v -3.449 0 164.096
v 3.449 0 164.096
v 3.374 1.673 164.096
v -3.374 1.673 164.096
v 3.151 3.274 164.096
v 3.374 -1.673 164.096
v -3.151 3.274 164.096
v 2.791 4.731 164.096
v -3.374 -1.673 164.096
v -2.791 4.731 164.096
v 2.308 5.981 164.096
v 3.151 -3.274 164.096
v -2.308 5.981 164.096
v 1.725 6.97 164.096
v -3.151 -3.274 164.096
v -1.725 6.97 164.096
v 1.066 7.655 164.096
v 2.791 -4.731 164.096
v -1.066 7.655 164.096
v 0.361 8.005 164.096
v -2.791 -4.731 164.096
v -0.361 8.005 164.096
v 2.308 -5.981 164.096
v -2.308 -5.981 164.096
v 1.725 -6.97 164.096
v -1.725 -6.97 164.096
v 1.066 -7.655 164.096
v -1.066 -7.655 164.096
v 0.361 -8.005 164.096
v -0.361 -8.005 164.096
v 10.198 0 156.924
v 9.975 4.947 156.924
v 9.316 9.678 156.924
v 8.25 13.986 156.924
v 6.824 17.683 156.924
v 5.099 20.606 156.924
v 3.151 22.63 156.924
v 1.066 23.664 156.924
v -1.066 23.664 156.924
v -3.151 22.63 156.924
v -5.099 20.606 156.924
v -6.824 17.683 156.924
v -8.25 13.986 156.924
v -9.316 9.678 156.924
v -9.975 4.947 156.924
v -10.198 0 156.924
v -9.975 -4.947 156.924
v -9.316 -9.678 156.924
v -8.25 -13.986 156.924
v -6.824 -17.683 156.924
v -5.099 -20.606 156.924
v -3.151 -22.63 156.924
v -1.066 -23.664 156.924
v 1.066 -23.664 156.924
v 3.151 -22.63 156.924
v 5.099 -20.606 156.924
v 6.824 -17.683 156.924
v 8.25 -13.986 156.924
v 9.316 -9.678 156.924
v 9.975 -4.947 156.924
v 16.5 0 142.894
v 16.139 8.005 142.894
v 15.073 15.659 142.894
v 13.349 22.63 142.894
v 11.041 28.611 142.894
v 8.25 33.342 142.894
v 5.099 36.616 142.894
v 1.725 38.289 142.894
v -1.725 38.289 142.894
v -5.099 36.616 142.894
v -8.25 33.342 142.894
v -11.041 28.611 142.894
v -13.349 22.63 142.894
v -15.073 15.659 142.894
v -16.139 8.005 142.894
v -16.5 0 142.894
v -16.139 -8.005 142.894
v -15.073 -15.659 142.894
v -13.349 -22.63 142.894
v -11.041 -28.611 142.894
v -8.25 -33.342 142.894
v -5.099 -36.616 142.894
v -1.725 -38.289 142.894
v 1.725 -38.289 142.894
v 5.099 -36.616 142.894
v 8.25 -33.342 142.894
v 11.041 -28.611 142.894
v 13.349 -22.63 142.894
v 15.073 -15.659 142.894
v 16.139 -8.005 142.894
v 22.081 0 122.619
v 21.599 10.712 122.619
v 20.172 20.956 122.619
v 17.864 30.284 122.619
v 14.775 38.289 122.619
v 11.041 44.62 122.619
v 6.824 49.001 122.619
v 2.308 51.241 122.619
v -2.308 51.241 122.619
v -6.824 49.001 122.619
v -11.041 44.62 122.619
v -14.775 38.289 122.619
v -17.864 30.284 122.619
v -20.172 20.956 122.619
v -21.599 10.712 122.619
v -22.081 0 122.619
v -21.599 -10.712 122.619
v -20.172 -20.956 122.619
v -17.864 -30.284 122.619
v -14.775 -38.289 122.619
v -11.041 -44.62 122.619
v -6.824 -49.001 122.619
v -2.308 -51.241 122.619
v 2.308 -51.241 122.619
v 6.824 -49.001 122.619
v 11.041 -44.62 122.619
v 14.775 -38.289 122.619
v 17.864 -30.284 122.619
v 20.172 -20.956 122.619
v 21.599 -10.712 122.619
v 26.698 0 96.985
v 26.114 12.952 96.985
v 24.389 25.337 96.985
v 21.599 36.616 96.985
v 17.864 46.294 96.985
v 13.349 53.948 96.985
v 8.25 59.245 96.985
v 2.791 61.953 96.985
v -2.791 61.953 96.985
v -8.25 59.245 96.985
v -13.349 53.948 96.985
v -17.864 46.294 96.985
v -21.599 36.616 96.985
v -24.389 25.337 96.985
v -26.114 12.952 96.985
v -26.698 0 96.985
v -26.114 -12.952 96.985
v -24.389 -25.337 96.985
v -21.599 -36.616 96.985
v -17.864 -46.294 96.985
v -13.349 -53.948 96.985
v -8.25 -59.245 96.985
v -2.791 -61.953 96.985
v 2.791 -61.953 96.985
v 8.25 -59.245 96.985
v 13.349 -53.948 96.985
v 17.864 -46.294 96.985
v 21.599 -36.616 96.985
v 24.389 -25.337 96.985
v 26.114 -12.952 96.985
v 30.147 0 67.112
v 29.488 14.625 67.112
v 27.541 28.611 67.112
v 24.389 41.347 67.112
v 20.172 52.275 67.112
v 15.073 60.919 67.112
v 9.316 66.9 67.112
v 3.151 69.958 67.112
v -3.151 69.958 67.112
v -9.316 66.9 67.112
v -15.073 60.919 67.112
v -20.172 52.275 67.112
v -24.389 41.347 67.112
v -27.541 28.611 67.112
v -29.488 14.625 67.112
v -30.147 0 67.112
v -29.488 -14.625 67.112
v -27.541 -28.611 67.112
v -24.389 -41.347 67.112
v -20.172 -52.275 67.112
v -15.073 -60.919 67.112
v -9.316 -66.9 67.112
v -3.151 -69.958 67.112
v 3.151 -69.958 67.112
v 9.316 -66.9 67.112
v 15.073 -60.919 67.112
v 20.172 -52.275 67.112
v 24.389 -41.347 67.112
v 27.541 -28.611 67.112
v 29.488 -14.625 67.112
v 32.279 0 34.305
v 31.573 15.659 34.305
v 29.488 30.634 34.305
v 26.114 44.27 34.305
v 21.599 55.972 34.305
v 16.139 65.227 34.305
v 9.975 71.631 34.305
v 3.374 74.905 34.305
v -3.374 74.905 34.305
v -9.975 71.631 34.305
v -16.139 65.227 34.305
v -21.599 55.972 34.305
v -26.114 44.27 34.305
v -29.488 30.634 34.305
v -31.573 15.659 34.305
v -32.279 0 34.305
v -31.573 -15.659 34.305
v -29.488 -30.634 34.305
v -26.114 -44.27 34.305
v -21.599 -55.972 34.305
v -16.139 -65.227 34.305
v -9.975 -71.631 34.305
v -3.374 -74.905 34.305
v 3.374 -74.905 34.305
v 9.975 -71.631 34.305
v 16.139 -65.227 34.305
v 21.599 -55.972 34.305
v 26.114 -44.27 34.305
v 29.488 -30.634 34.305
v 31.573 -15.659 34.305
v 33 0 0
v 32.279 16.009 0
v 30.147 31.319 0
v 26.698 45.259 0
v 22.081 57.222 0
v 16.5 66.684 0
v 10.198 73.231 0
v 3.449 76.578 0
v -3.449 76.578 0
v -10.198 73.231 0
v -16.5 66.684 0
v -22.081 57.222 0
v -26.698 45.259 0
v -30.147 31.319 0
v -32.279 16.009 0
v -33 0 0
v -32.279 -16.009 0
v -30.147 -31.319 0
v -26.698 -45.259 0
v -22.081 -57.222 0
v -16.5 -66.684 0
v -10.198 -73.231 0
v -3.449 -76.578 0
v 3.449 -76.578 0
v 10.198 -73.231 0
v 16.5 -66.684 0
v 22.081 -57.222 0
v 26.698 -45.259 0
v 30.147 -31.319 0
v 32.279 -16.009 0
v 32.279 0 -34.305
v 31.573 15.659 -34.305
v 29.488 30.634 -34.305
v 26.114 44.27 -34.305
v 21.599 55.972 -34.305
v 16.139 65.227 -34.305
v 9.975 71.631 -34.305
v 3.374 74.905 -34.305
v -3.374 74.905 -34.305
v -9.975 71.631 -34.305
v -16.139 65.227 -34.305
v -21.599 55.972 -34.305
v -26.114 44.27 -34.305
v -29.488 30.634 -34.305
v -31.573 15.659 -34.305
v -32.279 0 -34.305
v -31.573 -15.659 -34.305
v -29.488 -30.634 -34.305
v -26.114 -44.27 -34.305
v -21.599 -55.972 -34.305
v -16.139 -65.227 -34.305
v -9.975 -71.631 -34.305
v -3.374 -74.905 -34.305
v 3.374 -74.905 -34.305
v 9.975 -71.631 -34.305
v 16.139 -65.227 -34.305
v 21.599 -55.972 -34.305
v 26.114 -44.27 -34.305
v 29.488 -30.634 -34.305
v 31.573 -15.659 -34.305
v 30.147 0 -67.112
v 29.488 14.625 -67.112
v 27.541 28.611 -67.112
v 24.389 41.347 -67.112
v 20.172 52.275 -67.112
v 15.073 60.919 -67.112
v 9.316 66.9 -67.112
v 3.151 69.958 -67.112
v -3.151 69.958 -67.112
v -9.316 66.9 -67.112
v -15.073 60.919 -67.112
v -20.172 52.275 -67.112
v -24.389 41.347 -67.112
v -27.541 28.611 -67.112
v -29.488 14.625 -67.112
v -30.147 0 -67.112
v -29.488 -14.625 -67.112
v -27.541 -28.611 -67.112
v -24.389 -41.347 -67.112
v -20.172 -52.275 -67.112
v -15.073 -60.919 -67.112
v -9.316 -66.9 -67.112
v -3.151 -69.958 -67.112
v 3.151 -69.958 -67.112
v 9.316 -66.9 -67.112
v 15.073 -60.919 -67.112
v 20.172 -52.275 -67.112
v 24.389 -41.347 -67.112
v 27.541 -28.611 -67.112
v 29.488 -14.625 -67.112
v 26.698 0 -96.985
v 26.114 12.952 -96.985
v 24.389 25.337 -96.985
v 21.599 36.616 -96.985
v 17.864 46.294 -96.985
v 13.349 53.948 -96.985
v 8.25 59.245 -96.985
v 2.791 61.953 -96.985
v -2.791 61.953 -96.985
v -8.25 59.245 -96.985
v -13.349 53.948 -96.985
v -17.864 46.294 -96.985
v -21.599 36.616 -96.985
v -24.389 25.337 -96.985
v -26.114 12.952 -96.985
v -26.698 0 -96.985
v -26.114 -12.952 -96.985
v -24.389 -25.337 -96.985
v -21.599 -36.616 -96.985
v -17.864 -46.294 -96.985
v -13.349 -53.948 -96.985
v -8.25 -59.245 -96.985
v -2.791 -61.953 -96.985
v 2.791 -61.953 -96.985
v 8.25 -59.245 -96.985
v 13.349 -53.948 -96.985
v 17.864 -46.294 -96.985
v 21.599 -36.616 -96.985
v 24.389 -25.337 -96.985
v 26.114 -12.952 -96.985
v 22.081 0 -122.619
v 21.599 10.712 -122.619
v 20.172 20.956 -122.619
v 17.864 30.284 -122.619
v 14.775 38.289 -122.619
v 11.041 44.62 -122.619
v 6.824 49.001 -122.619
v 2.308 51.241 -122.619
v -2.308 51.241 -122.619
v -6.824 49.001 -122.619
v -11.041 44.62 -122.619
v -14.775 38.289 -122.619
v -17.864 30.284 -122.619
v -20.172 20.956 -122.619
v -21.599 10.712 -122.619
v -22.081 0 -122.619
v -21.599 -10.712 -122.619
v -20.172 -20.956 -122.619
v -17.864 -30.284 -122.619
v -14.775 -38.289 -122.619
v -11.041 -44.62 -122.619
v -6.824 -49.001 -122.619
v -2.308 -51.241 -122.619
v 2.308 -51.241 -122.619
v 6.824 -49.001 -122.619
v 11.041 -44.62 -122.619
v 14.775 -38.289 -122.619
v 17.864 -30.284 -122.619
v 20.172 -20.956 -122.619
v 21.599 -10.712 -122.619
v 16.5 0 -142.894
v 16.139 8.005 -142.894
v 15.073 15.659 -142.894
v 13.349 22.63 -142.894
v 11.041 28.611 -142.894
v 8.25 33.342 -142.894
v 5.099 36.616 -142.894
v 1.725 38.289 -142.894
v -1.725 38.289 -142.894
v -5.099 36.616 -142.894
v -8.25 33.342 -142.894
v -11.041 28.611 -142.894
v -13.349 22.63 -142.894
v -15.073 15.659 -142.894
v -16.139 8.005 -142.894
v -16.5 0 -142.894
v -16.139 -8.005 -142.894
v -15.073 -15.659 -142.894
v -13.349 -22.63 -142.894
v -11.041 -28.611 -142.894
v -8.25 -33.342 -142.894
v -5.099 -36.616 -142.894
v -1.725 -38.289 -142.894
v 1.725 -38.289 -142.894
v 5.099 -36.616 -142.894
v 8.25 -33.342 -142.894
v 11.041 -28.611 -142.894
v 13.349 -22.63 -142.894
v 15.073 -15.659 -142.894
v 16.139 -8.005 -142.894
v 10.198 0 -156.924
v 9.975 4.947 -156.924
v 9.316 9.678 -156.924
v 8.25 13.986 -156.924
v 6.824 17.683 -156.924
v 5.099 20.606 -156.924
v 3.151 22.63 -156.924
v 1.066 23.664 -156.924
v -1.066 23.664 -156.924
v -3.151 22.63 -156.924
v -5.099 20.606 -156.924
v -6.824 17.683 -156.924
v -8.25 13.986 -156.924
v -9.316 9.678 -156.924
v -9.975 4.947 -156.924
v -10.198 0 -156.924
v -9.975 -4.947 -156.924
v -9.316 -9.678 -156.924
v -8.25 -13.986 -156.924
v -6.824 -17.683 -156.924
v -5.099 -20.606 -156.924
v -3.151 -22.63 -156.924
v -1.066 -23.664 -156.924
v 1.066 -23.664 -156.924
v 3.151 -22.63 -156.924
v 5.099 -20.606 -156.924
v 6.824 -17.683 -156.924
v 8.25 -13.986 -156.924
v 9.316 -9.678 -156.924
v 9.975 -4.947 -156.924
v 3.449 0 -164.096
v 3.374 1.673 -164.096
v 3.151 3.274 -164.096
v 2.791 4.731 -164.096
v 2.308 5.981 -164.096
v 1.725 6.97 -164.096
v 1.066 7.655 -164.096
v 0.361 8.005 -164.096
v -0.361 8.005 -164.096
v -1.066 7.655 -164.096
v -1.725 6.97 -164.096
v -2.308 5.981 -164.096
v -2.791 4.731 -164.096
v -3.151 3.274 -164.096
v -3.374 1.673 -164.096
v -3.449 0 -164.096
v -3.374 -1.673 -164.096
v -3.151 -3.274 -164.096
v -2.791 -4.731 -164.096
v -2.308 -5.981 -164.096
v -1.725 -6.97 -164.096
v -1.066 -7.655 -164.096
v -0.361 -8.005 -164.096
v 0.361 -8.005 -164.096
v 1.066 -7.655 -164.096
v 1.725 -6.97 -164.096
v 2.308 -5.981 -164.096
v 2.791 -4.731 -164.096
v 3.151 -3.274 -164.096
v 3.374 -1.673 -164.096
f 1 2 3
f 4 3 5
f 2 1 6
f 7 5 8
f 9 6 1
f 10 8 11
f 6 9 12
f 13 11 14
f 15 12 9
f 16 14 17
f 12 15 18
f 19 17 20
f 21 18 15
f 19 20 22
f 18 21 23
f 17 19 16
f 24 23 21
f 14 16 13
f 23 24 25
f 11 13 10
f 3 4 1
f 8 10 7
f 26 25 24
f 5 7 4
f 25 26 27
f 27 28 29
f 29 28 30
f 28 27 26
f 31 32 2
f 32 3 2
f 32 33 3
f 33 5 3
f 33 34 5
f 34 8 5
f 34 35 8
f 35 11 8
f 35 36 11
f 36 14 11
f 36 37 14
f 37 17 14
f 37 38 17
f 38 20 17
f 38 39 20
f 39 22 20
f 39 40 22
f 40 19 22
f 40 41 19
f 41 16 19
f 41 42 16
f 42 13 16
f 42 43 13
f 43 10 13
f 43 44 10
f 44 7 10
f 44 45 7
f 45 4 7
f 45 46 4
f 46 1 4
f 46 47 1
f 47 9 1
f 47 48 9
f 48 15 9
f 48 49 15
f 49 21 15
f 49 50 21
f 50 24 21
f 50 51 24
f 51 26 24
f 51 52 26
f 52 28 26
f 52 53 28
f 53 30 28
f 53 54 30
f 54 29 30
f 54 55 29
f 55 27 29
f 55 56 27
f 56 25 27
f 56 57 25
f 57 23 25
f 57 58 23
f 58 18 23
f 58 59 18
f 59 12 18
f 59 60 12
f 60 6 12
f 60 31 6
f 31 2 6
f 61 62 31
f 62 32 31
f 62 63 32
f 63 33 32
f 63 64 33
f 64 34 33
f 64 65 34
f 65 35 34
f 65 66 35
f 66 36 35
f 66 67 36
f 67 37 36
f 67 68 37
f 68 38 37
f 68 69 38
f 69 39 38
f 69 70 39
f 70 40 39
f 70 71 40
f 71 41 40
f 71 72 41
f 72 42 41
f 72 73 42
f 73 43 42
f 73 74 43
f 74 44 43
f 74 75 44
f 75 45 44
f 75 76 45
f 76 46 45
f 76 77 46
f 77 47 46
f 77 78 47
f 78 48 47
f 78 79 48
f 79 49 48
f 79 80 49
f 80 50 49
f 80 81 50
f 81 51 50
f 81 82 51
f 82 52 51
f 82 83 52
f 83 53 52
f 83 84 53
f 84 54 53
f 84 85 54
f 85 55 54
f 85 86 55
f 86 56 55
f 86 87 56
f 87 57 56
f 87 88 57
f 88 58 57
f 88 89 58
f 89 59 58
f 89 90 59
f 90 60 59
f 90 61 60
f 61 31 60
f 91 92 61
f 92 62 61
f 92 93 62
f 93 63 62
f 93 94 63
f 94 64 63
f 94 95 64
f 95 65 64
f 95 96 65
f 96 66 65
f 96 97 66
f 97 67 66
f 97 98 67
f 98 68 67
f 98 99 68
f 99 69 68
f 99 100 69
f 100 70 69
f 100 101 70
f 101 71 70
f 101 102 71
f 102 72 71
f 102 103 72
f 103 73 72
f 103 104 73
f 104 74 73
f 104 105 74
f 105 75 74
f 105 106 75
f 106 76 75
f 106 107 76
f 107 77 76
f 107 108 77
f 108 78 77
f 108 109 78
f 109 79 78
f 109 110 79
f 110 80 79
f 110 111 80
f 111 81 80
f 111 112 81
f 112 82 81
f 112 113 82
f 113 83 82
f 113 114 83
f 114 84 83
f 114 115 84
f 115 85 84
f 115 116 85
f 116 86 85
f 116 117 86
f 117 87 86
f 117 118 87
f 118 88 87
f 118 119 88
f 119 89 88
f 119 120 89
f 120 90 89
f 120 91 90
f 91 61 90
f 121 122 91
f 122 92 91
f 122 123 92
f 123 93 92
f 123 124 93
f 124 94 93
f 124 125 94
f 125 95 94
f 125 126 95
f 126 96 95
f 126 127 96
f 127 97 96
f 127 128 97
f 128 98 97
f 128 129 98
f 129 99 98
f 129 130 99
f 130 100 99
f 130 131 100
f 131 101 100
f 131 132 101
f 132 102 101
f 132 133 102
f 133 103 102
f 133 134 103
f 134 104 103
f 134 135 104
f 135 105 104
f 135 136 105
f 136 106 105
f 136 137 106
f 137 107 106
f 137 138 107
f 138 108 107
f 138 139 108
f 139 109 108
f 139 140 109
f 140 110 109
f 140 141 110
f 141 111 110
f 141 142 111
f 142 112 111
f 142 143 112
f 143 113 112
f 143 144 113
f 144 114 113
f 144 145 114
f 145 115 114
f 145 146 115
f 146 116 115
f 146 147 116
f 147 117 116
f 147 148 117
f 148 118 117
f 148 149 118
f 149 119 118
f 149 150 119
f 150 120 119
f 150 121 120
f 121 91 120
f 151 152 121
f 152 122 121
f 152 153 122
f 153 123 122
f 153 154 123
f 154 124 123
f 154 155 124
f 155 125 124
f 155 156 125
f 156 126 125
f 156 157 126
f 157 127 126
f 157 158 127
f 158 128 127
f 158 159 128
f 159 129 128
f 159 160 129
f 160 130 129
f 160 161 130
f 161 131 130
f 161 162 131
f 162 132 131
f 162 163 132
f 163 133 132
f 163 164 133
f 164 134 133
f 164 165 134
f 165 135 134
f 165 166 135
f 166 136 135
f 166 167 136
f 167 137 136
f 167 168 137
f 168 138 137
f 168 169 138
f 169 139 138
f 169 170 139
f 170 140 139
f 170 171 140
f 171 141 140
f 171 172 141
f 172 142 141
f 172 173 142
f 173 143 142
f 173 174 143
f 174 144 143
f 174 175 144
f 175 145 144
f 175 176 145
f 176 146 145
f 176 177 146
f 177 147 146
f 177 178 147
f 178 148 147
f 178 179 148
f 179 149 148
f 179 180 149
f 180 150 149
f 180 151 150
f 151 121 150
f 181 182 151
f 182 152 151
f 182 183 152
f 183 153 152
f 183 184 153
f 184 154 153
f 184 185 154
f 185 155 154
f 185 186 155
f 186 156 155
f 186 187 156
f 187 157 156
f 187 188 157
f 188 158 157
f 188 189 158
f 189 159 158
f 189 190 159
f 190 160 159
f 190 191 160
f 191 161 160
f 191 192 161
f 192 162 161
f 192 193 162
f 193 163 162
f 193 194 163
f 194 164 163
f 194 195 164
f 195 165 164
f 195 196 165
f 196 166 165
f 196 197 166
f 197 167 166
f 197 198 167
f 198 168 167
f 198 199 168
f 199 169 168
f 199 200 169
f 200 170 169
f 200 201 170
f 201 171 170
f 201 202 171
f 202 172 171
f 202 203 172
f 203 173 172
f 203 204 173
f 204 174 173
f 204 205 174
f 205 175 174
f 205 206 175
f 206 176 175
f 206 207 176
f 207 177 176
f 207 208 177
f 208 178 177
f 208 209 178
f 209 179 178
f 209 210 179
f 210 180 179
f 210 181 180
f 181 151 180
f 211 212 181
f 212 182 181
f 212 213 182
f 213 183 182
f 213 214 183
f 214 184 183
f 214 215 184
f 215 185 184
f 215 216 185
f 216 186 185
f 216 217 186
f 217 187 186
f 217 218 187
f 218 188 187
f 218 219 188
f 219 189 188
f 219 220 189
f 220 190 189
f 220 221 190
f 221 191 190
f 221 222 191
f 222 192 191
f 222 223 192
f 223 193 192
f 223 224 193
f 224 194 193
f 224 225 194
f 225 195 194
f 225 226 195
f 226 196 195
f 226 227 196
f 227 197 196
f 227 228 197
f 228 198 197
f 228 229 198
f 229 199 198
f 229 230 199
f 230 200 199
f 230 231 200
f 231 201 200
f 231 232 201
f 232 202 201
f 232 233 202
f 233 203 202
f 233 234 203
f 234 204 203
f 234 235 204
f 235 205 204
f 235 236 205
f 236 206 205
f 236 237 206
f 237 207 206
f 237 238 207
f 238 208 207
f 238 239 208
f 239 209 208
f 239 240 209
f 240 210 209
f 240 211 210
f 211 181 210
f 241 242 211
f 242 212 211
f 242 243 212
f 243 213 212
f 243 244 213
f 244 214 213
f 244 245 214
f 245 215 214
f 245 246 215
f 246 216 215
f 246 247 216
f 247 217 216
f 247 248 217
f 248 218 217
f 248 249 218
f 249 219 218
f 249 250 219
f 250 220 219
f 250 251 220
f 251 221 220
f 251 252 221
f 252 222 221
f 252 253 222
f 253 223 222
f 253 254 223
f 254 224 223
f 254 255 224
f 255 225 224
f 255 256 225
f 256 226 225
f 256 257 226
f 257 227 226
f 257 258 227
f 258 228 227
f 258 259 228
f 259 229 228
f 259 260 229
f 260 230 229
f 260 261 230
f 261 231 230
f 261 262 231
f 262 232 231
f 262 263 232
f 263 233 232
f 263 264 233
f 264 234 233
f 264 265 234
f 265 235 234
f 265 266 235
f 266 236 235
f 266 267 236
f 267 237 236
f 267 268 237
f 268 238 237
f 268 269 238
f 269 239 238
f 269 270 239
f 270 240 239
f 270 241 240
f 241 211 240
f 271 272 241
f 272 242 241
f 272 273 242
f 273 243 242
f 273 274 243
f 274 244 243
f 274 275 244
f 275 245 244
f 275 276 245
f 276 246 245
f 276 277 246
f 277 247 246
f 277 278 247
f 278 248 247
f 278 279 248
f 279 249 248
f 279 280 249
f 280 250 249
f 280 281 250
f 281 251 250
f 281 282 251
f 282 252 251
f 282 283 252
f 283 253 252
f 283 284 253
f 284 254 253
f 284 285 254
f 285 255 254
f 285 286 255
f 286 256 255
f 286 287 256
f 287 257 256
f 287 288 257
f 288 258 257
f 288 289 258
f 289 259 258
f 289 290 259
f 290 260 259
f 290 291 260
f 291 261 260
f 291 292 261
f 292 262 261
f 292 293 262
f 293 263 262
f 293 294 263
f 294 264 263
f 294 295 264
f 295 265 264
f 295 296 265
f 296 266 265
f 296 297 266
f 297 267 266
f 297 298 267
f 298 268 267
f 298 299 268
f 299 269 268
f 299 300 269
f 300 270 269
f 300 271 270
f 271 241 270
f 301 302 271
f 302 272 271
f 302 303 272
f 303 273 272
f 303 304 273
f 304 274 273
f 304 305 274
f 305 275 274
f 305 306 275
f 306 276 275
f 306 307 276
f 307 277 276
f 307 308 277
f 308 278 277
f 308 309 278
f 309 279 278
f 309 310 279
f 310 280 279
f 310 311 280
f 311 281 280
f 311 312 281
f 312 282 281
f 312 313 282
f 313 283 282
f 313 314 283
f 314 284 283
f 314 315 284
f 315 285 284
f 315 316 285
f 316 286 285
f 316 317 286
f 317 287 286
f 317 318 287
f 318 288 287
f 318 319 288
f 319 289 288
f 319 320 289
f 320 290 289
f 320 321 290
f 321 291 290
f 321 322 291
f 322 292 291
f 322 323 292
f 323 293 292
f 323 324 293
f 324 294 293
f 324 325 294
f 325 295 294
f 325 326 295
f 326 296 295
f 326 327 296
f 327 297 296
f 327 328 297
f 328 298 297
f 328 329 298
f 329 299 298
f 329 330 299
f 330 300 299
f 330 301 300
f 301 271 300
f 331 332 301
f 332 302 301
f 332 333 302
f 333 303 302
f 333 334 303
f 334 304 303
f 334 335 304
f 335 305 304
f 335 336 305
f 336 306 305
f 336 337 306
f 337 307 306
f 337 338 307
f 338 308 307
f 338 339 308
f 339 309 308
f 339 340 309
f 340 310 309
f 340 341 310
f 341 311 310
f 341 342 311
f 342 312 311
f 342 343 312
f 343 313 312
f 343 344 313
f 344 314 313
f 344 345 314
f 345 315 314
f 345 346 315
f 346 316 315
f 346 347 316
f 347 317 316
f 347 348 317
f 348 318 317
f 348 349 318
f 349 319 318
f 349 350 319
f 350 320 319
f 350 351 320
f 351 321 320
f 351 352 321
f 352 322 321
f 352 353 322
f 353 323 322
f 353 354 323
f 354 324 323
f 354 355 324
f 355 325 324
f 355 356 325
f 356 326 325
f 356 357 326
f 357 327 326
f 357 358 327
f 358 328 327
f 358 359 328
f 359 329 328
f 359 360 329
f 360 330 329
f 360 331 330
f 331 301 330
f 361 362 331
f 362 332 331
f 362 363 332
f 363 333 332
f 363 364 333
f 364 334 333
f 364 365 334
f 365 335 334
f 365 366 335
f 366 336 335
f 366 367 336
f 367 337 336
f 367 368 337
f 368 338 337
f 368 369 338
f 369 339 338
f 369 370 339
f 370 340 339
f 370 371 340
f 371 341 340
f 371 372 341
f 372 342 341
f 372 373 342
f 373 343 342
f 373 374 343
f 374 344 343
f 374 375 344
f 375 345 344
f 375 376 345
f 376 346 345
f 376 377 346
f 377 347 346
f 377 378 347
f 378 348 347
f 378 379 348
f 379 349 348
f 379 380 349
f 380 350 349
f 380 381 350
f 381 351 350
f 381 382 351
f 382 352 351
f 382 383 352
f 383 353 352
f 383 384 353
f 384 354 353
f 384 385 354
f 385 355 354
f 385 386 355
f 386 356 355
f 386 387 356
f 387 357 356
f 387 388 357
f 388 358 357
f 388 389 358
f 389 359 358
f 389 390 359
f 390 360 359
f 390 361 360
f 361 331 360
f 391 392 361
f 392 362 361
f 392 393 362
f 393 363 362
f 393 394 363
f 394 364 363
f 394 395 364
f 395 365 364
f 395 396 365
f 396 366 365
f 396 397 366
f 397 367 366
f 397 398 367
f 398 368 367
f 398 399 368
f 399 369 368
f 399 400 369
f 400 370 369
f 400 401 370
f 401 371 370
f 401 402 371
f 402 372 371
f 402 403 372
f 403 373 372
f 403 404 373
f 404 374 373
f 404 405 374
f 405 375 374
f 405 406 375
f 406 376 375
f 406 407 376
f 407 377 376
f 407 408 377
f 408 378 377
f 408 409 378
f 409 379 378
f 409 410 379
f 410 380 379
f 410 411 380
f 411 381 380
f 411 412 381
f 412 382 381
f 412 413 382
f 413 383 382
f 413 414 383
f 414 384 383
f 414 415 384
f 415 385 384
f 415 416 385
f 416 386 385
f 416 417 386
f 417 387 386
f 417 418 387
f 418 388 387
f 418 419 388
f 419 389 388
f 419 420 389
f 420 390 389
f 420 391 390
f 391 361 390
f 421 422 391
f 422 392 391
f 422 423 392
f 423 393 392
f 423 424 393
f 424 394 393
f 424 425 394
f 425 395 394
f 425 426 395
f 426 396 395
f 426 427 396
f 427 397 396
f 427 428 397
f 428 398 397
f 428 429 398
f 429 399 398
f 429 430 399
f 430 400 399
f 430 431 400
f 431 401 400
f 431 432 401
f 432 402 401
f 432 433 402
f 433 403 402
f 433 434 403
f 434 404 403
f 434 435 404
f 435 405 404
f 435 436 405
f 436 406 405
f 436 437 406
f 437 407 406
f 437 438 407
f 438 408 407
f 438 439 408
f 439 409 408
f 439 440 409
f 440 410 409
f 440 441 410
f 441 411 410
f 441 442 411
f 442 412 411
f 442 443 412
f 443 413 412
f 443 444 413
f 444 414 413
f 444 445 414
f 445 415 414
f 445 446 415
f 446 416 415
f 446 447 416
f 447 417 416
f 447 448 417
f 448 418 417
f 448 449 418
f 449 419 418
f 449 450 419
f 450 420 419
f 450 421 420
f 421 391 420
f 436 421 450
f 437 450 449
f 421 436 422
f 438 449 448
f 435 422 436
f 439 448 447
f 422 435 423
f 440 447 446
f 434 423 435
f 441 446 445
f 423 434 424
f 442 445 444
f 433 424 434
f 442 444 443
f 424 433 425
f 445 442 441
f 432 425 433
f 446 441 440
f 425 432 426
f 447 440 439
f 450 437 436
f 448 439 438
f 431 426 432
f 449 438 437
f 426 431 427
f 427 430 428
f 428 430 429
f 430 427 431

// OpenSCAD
// Generated by SolidPython 1.0.1 on 2020-07-29 00:46:45


scale(v = [3, 7, 15]) {
	sphere(r = 11);
}
/***********************************************
*********      SolidPython code:      **********
************************************************
 
# import packages: SolidPython
from solid import *
from solid.utils import *
from itertools import chain, combinations, permutations


class Resize:

    def __init__(self, scad_file):
        self.scad_file = scad_file
        #self.scad_file = import_scad(scad_file)
        # cone/cylinder param:
        self.r1 = 0
        self.r2 = 0
        self.h = 0
        # rectangular prism param:
        self.w = 0
        self.l = 0
        # ellipse param:
        self.r = 0

    # import OpenScad code (file name corresponds to shape)


    # classify shape + parameters
    def assign(self, param1, param2, param3):
        if self.scad_file == 'cone.scad':
            self.r1 = param1
            self.r2 = param2
            self.h = param3
        elif self.scad_file == 'cylinder.scad':
            self.r1 = param1
            self.r2 = param2
            self.h = param3
        elif self.scad_file == 'rectangularPrism.scad':
            self.h = param1
            self.l = param2
            self.w = param3
        else:
            self.r = param1
            self.h = param2

    # resize parameters
    def iterate(self):
        x = range(3, 20, 2)
        i = 1
        if self.scad_file == 'cone.scad':
            tempList = list(permutations(x, 2))
            for temp in tempList:
                param1 = temp[0]
                param2 = temp[1]
                filepath = 'produced_scad_files/' + 'cone' + str(param1) + '_' + str(param2) + '_' + '.scad'
                scad_render_to_file(cylinder(h=param1, r1=param2, r2=0), filepath)

        elif self.scad_file == 'cylinder.scad':
            tempList = list(permutations(x, 3))
            for temp in tempList:
                param1 = temp[0]
                param2 = temp[1]
                filepath = 'produced_scad_files/' + 'cylinder' + str(param1) + '_' + str(param2) + '_' + '.scad'
                scad_render_to_file(cylinder(h=param1, r1=param2, r2=param2), filepath)

        elif self.scad_file == 'rectangularPrism.scad':
            tempList = list(permutations(x, 3))
            for temp in tempList:
                param1 = temp[0]
                param2 = temp[1]
                param3 = temp[2]
                filepath = 'produced_scad_files/' + 'rectangularPrism' + str(param1) + '_' + str(param2) + '_' + str(
                    param3) + '.scad'
                scad_render_to_file(cube(size=(param1, param2, param3)), filepath)

        elif self.scad_file == 'ellipse.scad':
            tempList = list(permutations(x, 4))
            for temp in tempList:
                param1 = temp[0]
                param2 = temp[1]
                param3 = temp[2]
                param4 = temp[3]
                filepath = 'produced_scad_files/' + 'ellipse' + str(param1) + '_' + str(param2) + '_' + str(param3) + '_' + str(param4) + '.scad'
                scad_render_to_file(scale([param1, param2, param3])(sphere(r=param4)), filepath)

    def render_to_scadfile(self):
        scad_render_to_file(scad, 'example.scad') 
 
************************************************/
